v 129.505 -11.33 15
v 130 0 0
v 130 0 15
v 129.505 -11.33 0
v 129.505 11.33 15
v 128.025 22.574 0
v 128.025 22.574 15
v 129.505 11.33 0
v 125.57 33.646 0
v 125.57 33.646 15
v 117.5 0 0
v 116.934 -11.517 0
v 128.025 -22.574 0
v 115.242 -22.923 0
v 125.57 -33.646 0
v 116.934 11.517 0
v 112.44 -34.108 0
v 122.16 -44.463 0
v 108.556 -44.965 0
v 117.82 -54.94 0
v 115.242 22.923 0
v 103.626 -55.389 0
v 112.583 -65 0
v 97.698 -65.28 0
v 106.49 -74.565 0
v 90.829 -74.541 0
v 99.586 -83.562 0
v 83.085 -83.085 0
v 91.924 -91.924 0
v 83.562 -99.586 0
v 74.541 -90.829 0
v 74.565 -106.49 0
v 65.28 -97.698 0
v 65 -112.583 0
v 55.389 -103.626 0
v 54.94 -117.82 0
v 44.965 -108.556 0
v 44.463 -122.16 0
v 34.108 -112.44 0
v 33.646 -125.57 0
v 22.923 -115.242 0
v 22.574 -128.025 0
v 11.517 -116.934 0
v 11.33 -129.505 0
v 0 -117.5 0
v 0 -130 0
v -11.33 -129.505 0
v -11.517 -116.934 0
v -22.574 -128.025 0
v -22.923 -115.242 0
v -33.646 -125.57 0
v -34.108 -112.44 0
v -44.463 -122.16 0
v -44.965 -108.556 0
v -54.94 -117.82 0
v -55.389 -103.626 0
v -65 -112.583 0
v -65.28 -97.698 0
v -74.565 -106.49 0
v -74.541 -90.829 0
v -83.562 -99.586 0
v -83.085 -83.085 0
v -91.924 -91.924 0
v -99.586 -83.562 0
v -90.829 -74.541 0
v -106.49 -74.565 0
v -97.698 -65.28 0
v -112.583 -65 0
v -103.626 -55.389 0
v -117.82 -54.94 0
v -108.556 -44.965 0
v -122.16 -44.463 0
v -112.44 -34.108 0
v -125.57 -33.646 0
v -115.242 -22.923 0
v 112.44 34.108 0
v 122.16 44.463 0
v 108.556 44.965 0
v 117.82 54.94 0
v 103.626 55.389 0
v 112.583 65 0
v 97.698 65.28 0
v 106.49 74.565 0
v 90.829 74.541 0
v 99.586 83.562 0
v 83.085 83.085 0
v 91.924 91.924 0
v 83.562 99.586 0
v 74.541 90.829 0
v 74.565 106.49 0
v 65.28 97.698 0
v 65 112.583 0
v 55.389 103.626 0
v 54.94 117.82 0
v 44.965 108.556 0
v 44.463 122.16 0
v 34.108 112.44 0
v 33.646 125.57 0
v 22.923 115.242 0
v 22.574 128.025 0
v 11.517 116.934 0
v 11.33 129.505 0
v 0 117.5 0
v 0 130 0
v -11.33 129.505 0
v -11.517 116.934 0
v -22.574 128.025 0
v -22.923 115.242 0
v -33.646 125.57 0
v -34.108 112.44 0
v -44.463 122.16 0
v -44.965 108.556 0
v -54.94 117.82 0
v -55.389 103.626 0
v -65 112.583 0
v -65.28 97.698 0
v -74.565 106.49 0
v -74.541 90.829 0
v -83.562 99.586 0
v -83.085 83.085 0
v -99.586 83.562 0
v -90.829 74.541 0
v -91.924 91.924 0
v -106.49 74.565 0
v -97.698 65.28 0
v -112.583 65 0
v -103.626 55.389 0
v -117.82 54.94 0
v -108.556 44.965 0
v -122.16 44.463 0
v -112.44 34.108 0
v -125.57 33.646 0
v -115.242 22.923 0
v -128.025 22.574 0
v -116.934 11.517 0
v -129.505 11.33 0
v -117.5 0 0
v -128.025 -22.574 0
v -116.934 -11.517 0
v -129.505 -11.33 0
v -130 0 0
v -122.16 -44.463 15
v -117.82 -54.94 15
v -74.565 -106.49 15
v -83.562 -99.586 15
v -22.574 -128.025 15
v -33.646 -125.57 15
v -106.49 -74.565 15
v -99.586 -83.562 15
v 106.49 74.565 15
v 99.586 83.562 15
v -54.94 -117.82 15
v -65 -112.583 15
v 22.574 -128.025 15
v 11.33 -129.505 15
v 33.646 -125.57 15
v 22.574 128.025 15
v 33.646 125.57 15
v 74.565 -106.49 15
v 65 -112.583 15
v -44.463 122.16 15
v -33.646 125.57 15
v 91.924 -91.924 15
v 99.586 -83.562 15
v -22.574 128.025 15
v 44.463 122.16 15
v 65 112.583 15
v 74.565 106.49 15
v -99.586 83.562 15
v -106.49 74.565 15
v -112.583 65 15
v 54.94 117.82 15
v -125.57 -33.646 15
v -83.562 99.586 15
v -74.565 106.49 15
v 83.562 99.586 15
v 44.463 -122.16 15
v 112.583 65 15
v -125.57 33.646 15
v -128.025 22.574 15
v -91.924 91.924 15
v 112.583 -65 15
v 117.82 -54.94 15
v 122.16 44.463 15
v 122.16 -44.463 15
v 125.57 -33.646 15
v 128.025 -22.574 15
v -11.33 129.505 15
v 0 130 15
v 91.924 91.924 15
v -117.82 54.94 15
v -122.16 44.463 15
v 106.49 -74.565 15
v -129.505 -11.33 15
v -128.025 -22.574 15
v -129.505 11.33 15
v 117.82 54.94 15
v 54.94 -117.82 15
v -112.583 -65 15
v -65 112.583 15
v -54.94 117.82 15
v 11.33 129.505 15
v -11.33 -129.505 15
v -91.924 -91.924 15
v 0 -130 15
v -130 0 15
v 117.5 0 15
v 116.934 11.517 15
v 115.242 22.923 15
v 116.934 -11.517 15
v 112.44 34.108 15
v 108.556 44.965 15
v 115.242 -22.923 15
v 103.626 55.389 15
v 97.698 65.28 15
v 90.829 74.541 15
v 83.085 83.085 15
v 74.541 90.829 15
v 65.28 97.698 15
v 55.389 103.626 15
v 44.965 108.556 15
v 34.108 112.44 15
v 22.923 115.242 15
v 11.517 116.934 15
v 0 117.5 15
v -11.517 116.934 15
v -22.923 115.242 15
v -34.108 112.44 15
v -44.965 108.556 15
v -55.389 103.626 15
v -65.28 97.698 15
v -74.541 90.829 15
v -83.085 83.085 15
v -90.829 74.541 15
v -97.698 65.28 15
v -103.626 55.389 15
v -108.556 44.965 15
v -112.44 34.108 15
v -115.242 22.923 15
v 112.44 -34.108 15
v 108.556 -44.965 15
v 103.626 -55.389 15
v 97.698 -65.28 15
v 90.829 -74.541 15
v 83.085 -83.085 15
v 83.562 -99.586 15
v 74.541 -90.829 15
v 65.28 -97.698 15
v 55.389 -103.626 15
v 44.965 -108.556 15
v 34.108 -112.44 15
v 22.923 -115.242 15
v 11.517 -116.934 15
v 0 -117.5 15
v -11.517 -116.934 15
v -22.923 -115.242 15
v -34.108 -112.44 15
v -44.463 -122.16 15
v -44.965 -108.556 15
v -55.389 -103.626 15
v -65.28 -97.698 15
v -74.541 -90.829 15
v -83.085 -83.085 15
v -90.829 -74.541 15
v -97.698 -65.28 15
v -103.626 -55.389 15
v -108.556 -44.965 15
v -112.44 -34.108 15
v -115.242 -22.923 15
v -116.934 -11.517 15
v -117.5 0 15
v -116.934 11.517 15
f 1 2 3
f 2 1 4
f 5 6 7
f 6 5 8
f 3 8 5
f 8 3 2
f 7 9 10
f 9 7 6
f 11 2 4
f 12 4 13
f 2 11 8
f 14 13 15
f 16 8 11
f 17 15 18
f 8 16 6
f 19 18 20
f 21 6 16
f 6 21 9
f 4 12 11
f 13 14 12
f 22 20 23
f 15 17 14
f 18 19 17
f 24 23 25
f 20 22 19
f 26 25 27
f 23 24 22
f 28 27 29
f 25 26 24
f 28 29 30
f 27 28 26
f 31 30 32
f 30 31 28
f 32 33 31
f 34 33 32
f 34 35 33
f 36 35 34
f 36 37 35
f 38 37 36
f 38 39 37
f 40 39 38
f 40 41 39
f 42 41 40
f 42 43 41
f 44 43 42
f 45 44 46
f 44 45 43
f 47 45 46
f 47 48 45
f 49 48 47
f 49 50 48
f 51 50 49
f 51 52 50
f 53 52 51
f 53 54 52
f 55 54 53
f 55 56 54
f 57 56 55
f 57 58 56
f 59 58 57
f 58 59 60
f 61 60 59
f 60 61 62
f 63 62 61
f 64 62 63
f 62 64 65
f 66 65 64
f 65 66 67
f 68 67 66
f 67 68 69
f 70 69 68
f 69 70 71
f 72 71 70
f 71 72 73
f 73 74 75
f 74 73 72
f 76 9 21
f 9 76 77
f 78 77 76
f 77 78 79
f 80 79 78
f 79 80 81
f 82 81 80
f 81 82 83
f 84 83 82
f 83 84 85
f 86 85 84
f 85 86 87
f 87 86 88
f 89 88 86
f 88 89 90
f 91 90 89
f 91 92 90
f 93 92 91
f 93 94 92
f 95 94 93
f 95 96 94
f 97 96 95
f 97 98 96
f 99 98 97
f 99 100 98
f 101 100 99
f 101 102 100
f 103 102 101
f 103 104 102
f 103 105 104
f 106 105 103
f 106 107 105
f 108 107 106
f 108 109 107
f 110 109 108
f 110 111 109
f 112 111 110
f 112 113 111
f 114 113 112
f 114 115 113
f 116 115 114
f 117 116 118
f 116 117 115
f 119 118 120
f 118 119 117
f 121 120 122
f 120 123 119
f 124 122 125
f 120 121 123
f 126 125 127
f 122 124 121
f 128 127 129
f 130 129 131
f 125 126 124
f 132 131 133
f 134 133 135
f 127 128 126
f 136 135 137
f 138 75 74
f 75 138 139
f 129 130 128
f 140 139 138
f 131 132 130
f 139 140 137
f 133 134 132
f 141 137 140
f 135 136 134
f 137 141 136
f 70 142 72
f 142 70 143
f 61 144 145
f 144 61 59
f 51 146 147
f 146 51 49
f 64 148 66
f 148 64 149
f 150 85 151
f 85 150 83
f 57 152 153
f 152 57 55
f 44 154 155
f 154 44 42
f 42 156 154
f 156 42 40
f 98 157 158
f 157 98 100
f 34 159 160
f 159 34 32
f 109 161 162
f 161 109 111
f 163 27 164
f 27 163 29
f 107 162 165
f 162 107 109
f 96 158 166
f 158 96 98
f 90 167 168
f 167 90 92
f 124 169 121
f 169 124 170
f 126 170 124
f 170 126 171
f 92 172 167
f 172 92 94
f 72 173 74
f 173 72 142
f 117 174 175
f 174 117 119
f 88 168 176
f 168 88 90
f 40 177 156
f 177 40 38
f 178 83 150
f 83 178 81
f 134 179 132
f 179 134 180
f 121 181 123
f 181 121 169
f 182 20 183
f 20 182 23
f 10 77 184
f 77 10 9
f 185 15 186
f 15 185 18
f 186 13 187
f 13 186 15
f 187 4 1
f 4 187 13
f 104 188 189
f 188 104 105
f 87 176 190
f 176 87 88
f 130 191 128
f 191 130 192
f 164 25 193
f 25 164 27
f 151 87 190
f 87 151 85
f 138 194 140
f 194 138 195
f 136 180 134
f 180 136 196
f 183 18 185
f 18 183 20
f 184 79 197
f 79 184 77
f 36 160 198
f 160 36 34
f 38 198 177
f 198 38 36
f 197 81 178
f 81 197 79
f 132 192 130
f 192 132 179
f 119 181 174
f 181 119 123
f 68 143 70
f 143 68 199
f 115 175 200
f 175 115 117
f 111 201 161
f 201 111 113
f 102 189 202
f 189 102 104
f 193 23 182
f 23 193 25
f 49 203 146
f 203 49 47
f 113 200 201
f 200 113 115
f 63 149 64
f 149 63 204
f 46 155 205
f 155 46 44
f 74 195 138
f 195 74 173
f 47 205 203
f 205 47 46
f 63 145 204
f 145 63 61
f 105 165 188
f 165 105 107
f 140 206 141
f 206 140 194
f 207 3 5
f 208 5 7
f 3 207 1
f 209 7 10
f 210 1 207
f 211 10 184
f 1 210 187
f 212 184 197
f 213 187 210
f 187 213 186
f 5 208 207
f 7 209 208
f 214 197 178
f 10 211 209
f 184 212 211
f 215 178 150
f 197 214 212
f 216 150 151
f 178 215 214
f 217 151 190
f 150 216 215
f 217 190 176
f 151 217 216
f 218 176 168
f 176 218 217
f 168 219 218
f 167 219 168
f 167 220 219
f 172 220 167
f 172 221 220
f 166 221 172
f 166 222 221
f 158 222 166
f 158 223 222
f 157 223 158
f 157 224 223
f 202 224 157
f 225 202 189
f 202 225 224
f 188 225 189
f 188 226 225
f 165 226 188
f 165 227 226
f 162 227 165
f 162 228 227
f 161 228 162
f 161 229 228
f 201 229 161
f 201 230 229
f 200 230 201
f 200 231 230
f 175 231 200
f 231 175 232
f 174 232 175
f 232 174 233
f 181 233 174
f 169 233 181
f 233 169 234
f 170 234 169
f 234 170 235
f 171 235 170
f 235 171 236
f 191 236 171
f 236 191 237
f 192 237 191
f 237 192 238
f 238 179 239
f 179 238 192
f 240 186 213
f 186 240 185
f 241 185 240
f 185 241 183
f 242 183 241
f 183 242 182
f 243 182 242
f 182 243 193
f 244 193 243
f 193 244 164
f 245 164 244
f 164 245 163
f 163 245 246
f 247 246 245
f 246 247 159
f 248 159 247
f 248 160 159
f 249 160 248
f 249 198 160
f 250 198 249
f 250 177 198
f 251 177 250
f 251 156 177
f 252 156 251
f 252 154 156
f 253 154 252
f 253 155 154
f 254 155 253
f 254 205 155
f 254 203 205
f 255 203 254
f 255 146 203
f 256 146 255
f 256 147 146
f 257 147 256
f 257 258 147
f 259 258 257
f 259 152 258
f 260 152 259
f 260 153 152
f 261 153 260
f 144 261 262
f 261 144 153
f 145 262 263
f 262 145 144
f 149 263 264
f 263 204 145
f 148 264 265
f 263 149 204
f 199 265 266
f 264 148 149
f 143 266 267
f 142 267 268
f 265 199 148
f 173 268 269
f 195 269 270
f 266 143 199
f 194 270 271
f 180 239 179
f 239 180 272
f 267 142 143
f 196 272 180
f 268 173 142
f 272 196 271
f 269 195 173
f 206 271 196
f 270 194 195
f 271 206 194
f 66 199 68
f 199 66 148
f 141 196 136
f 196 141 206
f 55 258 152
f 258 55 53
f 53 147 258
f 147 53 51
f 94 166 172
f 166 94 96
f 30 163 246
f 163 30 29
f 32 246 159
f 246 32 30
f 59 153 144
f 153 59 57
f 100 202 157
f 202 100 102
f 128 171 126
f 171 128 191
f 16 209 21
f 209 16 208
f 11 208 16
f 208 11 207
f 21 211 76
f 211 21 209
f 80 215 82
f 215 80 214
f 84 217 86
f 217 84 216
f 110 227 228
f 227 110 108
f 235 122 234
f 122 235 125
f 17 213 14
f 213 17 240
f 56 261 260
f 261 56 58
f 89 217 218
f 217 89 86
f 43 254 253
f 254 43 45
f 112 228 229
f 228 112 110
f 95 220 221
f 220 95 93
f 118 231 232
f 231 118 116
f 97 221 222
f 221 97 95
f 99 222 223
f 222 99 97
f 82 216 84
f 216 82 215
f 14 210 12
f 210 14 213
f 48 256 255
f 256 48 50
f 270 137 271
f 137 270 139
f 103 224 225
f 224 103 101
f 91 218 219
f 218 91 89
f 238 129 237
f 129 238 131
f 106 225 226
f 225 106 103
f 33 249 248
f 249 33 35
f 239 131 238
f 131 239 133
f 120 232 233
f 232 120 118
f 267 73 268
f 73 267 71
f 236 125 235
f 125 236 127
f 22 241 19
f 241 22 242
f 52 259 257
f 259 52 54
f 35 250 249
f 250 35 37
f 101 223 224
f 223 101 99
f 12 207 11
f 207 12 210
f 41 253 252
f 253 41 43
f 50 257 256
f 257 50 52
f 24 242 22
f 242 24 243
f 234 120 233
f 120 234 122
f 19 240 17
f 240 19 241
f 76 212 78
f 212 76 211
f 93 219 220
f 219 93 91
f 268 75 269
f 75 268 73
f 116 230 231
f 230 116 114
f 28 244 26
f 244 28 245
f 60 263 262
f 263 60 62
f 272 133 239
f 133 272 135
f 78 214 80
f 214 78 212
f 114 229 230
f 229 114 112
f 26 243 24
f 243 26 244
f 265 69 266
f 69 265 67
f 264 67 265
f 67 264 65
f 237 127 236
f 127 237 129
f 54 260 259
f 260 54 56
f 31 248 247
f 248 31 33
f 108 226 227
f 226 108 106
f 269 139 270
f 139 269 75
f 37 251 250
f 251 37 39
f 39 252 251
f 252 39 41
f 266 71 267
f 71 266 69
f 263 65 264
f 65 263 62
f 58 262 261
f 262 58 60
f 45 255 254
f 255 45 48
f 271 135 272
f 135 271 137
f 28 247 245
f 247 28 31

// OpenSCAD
// file: lib/generated_constants.scad
// AUTO-GENERATED from simulation/sizing.py — do not hand edit
P_target_W = 10.0;
A_mem_m2 = 0.72;
active_w = 200.0;
active_h = 300.0;
n_plates = 12;
housing_od = 280.0;
housing_len = 264;
bolt_circle = 240.0;
frame_L = 664;
frame_W = 480.0;
frame_H = 900;
delta_P_bar = 34.58;
plate_pitch = 12;
// main file
// CHORUS-SGH-1 — reinforcing ring for pressurized draw side
include <lib/generated_constants.scad>

module pressure_ring() {
    difference() {
        cylinder(h=15, d=housing_od - 20, $fn=72);
        cylinder(h=16, d=housing_od - 45, $fn=64);
    }
}

pressure_ring();
